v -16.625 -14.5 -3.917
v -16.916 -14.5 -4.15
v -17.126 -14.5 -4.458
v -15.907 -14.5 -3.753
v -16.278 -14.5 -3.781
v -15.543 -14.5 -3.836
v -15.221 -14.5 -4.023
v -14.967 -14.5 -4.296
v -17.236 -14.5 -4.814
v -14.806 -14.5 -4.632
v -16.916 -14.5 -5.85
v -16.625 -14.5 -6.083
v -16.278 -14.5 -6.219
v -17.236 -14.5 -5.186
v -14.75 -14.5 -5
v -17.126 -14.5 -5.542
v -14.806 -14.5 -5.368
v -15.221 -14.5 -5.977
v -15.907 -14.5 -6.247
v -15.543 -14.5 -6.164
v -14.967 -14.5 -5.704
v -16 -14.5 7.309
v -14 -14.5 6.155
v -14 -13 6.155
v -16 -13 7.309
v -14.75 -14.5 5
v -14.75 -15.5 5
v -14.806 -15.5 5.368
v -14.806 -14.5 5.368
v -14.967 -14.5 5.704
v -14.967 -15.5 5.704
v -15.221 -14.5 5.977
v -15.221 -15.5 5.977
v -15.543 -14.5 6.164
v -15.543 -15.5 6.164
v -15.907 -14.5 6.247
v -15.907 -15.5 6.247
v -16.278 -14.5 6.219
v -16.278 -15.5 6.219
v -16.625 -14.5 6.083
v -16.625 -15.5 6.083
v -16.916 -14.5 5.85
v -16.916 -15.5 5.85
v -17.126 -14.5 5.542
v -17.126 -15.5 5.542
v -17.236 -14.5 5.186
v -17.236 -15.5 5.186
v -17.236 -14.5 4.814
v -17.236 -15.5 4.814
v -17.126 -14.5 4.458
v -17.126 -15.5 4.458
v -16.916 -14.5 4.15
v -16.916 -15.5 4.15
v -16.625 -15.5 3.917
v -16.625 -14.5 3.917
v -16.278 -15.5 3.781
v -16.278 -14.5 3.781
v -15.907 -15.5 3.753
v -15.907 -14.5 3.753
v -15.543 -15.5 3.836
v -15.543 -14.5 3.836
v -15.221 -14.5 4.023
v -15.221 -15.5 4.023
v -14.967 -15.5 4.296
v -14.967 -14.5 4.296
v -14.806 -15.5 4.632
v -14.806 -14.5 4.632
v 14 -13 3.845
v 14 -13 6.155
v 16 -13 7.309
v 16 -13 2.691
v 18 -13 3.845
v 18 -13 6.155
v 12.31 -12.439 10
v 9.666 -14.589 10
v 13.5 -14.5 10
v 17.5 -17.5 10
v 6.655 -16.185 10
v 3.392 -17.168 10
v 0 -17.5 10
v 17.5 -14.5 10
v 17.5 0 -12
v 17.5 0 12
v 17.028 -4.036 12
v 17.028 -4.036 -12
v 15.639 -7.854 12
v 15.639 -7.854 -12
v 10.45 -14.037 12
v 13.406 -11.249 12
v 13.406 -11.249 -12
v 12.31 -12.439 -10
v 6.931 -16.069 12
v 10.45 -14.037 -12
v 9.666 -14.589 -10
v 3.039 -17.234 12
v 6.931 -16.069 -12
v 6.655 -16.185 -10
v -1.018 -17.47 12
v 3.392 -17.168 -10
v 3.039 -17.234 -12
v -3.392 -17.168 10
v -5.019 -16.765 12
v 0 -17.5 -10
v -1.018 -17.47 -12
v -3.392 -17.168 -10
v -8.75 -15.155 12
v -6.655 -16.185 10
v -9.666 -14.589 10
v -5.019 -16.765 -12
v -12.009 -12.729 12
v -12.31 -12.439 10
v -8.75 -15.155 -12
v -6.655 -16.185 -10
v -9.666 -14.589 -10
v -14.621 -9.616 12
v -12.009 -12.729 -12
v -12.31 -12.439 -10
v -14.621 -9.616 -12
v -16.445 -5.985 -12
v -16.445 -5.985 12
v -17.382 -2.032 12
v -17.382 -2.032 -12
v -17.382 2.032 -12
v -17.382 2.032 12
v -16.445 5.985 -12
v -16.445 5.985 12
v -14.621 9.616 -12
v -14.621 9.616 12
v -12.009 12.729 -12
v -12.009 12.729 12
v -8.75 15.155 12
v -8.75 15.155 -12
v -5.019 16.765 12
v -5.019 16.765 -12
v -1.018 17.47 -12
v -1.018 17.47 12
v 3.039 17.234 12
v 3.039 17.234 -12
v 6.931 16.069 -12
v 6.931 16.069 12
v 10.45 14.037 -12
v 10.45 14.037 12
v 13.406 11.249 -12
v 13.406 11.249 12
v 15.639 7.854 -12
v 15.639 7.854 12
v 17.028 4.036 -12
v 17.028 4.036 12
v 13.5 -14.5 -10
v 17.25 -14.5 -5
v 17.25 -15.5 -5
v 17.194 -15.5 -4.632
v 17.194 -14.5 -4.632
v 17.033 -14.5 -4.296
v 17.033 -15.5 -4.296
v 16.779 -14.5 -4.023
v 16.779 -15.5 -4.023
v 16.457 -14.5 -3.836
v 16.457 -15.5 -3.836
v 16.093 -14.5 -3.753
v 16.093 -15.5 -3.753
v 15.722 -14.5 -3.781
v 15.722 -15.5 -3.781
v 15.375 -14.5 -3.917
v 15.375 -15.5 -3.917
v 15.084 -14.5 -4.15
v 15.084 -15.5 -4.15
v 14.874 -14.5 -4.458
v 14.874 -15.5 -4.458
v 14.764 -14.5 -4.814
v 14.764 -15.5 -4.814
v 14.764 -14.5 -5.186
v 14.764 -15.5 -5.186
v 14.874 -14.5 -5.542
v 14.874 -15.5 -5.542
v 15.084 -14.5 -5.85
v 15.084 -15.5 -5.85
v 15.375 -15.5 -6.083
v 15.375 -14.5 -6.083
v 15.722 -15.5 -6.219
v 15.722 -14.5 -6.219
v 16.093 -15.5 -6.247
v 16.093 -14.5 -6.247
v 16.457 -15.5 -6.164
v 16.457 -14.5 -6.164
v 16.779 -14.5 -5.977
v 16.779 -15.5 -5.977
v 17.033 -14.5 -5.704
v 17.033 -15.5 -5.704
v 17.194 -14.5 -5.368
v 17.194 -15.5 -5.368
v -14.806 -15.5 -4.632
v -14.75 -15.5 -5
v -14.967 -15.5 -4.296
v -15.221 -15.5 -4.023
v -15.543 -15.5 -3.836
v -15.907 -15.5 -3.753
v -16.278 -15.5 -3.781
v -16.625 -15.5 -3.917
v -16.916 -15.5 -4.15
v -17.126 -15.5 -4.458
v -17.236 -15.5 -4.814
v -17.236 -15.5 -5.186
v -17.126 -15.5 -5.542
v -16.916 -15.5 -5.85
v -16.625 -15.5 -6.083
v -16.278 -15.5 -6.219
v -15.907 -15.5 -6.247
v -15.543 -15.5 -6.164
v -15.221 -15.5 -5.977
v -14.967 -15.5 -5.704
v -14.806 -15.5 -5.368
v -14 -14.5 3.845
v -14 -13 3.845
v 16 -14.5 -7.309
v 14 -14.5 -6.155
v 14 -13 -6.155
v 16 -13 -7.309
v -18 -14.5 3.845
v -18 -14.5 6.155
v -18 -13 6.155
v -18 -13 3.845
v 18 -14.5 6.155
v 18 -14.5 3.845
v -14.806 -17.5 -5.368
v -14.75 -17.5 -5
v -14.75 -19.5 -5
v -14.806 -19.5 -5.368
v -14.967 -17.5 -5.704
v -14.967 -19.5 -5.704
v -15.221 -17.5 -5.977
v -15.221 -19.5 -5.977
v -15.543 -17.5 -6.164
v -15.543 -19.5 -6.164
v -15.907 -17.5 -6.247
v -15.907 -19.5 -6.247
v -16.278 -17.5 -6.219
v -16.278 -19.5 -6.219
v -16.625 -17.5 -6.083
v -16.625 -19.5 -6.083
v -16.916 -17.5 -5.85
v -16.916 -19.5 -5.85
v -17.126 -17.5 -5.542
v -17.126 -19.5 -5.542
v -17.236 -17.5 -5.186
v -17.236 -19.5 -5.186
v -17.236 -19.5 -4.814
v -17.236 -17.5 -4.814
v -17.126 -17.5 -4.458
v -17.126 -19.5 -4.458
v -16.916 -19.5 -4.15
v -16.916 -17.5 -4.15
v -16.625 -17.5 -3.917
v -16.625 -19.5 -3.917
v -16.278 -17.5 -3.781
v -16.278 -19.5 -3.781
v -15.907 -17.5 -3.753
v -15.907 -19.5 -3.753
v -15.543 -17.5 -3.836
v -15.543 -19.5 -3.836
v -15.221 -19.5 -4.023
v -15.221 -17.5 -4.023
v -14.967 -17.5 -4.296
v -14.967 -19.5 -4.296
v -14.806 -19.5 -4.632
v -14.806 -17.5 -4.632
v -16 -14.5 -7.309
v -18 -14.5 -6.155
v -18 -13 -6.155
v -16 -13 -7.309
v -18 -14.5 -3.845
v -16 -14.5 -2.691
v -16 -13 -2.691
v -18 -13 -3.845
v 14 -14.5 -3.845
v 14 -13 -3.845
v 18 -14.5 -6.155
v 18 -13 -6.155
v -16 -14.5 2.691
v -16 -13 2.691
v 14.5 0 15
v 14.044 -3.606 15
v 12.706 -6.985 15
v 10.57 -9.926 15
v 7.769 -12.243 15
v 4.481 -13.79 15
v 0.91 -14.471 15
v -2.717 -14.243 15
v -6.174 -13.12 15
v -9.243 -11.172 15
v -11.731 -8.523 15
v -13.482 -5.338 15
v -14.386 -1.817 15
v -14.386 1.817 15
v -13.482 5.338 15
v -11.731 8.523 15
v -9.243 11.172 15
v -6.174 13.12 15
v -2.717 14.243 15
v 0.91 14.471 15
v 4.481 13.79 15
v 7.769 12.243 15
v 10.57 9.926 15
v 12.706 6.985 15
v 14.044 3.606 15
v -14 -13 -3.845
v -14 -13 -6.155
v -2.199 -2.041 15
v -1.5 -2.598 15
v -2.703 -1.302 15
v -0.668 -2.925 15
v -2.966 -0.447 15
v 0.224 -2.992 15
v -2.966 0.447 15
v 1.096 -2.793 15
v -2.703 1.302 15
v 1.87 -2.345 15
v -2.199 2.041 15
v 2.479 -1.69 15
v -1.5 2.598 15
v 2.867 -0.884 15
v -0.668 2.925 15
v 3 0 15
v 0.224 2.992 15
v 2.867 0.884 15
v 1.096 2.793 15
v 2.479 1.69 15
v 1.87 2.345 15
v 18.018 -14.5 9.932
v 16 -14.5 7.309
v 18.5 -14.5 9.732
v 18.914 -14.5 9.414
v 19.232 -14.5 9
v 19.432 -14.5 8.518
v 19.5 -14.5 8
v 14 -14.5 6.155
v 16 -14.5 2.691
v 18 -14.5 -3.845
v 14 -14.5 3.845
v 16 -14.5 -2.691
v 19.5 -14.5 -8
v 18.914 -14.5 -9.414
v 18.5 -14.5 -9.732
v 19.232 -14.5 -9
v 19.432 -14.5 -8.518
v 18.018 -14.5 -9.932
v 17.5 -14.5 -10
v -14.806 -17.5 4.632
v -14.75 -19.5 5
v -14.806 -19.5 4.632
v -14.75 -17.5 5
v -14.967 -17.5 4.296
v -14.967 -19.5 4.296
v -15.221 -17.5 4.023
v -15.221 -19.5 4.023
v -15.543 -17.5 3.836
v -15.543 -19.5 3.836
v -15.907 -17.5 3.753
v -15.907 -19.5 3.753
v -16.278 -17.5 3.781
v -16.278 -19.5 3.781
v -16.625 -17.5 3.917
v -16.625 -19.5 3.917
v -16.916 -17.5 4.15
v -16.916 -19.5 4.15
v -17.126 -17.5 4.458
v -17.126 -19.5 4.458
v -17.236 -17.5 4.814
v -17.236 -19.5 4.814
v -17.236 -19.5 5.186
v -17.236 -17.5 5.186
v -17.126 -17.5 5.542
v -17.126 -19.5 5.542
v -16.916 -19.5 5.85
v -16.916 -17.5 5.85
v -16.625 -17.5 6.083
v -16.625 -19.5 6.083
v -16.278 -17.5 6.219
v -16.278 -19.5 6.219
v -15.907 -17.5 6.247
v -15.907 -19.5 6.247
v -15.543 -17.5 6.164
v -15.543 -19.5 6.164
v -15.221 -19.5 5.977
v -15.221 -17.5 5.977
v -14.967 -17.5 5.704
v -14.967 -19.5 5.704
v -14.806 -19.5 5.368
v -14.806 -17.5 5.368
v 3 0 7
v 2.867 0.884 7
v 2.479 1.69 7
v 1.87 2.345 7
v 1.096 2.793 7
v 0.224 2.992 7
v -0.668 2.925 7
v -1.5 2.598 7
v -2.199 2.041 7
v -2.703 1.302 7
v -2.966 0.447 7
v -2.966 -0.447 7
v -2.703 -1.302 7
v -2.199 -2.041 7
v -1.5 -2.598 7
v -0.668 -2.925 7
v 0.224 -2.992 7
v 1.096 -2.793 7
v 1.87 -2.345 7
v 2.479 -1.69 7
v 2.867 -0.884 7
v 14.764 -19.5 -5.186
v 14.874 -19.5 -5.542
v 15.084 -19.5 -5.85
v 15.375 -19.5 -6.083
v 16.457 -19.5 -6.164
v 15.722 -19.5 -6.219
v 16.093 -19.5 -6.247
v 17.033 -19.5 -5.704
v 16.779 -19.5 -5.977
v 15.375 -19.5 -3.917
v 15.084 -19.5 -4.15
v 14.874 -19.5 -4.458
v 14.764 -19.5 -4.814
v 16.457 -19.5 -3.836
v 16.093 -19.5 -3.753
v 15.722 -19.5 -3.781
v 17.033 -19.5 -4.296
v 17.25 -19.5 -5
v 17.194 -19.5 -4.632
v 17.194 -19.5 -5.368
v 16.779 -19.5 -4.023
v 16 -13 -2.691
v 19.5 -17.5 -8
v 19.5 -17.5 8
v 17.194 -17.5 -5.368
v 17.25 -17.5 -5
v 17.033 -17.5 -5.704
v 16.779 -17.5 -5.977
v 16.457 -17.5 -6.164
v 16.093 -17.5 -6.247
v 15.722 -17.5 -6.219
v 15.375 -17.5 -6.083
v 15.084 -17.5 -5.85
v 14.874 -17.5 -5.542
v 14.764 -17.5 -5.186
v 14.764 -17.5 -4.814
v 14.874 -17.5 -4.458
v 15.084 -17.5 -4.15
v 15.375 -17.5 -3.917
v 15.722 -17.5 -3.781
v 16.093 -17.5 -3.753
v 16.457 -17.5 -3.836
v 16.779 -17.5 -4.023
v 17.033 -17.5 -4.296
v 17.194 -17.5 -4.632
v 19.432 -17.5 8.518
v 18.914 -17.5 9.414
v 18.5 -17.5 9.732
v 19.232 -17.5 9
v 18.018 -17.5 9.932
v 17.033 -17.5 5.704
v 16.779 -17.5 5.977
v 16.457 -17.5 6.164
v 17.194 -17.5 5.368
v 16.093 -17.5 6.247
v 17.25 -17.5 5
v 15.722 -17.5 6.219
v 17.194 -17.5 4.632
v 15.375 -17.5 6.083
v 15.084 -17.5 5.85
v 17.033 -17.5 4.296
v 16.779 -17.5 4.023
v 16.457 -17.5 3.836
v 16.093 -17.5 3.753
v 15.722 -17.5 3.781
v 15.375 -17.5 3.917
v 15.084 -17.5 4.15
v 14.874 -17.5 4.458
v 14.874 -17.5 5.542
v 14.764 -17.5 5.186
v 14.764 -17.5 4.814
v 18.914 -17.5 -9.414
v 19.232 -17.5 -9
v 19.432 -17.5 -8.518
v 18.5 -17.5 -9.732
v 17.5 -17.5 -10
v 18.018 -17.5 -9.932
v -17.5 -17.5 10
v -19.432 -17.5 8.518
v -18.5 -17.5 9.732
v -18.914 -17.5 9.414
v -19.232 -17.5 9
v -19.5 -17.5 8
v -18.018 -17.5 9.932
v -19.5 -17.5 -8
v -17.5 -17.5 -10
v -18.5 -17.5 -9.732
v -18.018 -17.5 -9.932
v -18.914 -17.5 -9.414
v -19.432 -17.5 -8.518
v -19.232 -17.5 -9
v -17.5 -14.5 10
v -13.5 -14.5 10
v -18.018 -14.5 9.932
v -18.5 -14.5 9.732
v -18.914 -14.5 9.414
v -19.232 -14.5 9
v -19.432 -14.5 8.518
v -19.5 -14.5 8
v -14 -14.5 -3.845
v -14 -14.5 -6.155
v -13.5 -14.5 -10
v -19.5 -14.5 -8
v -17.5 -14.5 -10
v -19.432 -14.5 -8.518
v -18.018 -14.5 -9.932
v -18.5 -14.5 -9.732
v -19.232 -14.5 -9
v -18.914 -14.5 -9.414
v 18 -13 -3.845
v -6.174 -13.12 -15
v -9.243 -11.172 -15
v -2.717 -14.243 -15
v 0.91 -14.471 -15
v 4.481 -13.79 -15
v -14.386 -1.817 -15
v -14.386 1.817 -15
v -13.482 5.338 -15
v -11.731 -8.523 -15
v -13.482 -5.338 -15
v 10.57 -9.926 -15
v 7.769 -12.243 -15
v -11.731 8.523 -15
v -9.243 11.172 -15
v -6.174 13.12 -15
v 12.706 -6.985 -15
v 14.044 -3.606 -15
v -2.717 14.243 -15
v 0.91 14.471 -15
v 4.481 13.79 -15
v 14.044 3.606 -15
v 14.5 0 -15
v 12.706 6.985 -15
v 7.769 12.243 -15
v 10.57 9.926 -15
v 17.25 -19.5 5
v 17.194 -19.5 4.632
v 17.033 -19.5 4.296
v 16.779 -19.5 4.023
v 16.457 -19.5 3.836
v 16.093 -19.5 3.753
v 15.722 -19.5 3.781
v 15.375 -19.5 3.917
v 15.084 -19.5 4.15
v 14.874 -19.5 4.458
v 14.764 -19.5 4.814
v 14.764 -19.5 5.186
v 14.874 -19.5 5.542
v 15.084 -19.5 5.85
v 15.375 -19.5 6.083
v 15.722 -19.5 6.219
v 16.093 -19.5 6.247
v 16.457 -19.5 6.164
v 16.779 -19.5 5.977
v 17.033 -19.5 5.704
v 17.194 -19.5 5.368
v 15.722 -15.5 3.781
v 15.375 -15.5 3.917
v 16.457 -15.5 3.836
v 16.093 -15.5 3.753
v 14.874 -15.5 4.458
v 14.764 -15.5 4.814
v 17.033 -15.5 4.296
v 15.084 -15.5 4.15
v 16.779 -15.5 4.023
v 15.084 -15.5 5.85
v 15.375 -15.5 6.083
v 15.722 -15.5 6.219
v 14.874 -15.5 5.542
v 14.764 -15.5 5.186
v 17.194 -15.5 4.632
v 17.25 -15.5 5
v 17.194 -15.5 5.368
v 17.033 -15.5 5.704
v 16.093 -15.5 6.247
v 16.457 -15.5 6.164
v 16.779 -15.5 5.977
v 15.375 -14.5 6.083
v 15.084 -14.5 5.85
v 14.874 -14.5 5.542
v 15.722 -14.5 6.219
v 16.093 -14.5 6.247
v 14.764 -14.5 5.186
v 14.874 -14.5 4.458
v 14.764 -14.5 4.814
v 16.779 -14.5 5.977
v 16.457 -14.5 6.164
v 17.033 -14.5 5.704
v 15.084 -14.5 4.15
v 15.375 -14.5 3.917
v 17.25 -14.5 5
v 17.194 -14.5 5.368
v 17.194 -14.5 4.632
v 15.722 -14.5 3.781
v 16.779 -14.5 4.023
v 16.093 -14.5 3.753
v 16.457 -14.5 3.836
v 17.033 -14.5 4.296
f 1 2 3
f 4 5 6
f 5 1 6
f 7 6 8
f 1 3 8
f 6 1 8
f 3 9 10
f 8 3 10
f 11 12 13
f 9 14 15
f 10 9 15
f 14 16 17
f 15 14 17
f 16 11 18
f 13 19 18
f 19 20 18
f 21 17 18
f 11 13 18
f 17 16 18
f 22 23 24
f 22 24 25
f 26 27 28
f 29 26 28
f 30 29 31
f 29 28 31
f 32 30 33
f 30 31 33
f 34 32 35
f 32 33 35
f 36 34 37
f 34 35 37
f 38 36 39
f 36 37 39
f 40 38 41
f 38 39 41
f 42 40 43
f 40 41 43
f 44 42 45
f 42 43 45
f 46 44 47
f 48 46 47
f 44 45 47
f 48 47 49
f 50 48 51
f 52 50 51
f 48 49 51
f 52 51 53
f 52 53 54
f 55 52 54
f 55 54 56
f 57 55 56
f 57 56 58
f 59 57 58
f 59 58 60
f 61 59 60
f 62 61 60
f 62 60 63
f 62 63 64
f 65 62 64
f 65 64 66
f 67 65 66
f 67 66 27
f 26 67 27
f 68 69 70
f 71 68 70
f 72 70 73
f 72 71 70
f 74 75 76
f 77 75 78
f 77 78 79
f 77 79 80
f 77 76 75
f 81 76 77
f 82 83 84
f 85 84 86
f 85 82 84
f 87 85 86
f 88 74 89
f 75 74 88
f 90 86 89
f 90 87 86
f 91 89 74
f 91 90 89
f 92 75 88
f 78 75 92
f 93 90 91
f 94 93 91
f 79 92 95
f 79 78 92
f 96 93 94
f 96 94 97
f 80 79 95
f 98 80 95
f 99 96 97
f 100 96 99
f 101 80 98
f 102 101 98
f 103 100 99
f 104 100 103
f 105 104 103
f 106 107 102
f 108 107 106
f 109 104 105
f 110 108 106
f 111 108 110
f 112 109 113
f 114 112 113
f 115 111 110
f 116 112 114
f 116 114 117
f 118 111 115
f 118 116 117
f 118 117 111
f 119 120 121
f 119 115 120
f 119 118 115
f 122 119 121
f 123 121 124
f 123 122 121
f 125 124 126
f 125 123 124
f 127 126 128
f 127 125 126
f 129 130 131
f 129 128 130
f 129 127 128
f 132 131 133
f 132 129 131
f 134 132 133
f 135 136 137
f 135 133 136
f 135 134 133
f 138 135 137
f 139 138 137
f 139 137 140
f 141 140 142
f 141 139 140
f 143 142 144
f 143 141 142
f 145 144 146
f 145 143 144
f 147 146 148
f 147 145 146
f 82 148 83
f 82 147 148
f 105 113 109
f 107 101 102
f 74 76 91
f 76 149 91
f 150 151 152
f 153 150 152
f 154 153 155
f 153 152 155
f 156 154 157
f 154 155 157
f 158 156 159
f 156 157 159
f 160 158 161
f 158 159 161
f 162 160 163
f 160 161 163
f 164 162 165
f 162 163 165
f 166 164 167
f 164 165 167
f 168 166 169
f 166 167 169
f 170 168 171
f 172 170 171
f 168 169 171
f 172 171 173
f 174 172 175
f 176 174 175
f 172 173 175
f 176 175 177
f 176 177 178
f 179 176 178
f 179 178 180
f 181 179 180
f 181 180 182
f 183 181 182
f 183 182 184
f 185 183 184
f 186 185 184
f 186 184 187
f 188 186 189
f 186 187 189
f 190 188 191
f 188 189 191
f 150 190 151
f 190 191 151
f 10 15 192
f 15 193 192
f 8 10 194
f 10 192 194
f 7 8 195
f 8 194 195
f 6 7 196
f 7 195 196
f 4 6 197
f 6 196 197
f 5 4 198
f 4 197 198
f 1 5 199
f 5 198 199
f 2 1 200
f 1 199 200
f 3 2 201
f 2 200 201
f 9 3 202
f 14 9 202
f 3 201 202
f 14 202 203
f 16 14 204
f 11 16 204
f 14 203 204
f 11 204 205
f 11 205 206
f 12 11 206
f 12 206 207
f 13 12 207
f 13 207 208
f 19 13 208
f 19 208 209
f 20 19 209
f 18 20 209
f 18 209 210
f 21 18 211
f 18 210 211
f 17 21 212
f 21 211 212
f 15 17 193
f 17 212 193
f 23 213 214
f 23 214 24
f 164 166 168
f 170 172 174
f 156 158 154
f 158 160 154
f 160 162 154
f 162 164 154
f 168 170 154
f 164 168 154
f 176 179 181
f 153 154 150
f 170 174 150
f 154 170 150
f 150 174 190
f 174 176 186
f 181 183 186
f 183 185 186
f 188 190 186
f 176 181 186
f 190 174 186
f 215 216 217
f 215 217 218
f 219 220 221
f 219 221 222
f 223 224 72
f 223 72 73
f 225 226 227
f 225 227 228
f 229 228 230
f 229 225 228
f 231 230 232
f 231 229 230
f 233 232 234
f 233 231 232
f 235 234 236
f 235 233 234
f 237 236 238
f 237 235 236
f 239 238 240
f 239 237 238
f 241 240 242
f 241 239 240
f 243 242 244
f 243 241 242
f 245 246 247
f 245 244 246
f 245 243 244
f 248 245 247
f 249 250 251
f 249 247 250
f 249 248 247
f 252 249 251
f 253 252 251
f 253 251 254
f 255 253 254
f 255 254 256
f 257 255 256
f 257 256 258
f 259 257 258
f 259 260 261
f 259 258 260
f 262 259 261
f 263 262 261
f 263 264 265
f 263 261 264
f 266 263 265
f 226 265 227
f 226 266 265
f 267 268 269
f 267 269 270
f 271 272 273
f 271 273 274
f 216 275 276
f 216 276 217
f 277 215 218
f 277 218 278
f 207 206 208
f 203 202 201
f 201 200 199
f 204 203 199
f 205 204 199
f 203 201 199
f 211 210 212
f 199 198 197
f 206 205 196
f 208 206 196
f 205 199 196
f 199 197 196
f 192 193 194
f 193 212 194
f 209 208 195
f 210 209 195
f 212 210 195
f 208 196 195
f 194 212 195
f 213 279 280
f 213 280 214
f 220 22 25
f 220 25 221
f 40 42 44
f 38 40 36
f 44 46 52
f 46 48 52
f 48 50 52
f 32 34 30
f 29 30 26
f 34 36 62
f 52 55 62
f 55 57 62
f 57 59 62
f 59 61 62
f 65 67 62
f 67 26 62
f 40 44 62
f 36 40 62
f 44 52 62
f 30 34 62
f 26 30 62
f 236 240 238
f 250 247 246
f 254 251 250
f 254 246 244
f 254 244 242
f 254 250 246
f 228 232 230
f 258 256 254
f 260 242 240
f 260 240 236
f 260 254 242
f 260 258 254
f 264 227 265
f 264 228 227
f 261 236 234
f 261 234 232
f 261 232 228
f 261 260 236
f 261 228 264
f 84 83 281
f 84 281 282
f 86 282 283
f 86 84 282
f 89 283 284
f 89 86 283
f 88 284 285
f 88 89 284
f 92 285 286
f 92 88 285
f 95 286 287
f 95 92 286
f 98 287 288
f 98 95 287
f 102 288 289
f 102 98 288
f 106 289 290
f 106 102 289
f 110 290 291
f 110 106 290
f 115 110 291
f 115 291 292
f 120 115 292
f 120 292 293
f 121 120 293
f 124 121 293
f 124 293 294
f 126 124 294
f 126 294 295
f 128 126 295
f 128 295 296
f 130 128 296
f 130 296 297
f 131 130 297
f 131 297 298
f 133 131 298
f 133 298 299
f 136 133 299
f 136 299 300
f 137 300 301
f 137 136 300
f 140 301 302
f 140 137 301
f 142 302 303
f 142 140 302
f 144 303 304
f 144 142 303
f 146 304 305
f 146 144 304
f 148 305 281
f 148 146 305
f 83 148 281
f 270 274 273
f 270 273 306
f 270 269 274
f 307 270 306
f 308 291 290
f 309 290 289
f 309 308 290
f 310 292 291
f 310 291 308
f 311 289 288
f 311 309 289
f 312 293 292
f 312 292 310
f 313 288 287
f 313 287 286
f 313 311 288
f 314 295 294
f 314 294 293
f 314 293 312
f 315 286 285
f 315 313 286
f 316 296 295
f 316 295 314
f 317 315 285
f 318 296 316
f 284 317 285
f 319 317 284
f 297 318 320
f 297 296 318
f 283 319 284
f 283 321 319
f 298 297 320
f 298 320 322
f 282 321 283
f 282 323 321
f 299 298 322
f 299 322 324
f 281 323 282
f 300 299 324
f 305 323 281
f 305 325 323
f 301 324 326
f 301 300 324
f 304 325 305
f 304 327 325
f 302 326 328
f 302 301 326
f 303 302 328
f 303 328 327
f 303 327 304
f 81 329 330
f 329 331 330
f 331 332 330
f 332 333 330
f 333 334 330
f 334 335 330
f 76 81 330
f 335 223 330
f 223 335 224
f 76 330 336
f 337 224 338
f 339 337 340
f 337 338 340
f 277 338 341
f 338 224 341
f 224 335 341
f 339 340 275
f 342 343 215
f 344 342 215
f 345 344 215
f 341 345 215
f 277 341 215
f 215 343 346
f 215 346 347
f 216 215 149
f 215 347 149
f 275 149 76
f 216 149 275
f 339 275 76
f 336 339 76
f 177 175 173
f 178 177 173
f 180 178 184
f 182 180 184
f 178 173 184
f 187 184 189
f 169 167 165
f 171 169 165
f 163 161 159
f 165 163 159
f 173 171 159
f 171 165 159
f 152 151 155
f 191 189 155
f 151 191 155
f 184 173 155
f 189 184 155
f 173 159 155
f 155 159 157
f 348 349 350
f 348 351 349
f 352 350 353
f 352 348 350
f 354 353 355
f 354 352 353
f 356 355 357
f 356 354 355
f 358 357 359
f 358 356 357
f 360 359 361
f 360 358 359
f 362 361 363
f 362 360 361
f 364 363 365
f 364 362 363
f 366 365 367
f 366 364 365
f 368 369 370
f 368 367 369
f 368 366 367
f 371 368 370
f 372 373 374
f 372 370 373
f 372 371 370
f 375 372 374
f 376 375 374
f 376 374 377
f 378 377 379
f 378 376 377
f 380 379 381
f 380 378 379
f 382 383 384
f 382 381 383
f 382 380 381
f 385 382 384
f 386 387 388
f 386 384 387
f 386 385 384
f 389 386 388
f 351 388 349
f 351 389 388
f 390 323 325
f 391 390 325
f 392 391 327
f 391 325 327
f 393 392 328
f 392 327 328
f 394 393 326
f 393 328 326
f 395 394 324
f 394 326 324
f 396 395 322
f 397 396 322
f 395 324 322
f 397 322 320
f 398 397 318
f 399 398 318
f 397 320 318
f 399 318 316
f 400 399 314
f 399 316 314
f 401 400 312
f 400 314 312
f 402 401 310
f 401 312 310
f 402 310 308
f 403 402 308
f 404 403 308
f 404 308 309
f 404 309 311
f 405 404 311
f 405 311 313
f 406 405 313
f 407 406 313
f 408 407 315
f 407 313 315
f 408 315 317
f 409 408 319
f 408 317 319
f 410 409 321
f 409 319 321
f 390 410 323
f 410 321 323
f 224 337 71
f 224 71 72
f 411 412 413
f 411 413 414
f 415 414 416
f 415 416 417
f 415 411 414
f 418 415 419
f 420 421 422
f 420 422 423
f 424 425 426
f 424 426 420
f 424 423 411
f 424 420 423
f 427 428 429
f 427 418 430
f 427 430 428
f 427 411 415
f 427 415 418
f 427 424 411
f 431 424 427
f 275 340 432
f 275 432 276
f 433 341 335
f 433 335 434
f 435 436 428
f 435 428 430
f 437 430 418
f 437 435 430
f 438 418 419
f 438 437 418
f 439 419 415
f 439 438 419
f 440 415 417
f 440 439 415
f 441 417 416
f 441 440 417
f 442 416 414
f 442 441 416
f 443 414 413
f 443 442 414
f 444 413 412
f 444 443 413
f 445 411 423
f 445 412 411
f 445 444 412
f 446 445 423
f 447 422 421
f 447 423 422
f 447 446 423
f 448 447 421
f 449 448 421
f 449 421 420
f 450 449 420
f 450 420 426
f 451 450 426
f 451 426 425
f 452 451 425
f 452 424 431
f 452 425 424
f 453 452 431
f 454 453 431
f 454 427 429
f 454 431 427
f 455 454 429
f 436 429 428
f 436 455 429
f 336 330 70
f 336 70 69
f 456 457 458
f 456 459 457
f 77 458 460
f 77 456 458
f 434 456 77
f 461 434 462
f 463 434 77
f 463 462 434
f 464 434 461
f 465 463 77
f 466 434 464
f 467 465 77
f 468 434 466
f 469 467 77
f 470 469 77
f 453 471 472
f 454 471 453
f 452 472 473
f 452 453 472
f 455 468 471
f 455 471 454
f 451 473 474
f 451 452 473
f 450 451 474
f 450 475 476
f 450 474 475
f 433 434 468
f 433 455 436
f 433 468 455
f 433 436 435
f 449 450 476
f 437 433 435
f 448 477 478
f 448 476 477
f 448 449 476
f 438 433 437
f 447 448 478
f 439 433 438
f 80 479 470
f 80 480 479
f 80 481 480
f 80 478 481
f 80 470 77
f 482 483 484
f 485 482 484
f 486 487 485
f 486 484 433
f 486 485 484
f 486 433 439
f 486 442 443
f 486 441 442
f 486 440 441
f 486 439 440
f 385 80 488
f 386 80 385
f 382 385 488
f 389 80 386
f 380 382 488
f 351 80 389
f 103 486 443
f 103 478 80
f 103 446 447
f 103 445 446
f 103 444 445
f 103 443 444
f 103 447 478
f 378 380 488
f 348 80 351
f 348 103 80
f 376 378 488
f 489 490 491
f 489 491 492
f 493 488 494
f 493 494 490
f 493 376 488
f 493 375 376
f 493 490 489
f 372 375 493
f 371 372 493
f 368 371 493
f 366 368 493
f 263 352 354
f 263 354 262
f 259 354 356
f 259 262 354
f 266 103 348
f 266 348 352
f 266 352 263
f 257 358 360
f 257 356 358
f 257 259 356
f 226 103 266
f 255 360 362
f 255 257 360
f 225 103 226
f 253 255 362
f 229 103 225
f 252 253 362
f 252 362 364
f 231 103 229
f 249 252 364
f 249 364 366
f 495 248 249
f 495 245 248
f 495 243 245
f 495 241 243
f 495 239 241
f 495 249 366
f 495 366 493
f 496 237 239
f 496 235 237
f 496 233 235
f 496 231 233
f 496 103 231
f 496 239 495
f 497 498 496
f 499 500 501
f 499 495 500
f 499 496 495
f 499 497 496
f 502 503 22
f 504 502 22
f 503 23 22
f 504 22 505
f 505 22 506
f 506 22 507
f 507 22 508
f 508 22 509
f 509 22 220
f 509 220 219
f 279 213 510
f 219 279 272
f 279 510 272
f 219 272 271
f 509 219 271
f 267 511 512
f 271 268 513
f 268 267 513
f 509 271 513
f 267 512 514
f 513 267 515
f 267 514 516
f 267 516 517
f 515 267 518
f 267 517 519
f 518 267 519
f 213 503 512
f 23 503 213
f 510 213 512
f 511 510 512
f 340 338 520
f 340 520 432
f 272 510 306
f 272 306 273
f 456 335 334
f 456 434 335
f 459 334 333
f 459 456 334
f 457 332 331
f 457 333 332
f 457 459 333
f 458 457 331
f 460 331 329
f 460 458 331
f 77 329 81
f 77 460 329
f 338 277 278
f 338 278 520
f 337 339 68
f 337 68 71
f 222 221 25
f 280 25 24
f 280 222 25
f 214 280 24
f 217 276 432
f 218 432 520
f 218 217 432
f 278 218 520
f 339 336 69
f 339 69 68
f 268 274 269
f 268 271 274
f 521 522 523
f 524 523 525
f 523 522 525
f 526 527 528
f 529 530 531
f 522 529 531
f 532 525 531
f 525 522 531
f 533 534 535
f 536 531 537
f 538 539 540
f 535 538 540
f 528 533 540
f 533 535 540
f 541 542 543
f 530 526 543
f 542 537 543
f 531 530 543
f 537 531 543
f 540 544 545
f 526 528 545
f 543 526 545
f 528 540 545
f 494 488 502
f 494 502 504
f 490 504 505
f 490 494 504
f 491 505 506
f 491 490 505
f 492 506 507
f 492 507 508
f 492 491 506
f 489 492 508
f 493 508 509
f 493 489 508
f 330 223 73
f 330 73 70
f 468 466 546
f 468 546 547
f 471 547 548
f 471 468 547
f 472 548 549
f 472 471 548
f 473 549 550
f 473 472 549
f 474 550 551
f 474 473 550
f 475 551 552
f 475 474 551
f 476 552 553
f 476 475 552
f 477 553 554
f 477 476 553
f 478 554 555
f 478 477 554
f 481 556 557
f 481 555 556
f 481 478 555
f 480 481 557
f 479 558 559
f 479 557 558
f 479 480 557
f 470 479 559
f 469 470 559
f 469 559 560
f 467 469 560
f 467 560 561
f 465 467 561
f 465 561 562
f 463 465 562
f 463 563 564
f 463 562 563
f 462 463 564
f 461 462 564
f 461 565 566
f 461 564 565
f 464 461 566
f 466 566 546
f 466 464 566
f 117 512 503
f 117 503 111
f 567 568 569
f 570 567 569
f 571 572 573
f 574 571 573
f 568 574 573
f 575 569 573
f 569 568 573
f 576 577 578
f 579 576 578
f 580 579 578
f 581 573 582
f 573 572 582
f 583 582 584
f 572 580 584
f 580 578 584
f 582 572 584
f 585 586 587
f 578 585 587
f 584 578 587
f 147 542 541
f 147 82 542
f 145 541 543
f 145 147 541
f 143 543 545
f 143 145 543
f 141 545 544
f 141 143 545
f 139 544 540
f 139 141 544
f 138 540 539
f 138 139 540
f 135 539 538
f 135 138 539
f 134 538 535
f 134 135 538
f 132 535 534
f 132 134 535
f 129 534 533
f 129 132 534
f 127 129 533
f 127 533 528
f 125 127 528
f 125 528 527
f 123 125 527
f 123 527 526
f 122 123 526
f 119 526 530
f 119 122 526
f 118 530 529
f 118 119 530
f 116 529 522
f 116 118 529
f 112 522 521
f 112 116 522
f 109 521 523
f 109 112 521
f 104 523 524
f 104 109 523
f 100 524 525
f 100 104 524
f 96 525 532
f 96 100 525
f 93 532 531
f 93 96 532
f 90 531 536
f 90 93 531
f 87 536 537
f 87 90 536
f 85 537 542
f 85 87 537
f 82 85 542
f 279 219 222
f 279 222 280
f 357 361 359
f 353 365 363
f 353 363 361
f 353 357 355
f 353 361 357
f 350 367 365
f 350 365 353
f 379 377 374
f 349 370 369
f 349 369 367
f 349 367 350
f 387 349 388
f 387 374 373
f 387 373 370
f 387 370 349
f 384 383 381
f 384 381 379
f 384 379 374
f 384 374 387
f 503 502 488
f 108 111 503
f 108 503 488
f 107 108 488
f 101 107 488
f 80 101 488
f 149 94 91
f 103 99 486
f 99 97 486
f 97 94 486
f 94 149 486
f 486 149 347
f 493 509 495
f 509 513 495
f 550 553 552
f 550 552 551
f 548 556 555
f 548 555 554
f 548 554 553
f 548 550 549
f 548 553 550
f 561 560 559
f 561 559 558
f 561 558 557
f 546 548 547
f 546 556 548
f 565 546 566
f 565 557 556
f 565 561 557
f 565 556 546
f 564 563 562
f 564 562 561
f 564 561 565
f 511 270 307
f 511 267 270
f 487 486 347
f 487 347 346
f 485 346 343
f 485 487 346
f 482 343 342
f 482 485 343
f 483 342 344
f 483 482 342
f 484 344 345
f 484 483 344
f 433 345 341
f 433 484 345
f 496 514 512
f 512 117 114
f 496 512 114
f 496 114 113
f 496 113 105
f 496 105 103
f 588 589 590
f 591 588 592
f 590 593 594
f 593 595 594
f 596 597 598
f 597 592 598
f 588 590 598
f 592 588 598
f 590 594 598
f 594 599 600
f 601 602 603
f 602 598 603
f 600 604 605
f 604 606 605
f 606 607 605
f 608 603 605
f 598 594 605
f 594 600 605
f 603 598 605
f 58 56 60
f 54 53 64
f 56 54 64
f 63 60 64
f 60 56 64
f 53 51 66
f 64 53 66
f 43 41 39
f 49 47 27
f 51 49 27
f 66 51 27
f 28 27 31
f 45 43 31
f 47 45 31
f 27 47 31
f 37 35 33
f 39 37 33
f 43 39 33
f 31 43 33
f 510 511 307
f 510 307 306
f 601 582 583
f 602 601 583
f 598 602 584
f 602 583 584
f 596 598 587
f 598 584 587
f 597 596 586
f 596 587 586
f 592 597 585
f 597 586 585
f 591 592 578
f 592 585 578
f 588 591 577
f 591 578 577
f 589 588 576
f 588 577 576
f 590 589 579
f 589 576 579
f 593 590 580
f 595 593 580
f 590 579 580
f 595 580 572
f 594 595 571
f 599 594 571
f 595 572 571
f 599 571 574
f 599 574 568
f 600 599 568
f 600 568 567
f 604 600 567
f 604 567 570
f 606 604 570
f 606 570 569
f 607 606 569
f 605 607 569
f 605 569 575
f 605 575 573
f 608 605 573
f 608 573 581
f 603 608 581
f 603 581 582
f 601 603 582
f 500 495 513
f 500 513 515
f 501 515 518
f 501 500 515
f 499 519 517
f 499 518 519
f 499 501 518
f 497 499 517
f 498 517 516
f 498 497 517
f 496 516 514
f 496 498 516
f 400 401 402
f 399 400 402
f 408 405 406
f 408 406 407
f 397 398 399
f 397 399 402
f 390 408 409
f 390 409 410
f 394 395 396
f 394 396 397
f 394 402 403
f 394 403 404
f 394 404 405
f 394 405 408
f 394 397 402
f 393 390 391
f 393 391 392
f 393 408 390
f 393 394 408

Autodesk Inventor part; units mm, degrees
ref_plane "YZ Plane" through (0, 0, 0) normal (1, 0, 0) x (0, 1, 0)
ref_plane "XZ Plane" through (0, 0, 0) normal (0, 1, 0) x (-1, 0, 0)
ref_plane "XY Plane" through (0, 0, 0) normal (0, 0, 1) x (1, 0, 0)
sketch "Sketch1" plane through (0, 0, 0) normal (0, 0, 1) x (1, 0, 0)
  circle A0 centre (0, 0) radius 17.5
  dimension "d0" = 35
extrude "Extrusion1" add sketch "Sketch1" along normal mid plane 30
sketch "Sketch2" plane through (0, 0, 0) normal (0, 0, 1) x (1, 0, 0)
  line L0 (0, 0) -> (0, -17.5) construction
  line L1 (0, -17.5) -> (-17.5, -17.5)
  line L2 (-17.5, -17.5) -> (-17.5, -14.5) construction
  line L3 (-17.5, -14.5) -> (-13.5, -14.5)
  line L4 (-13.5, -14.5) -> (-11.1906, -10.5)
  line L5 (0, -17.5) -> (17.5, -17.5)
  line L6 (17.5, -17.5) -> (17.5, -14.5) construction
  line L7 (17.5, -14.5) -> (13.5, -14.5)
  line L8 (13.5, -14.5) -> (11.1906, -10.5)
  line L9 (-11.1906, -10.5) -> (11.1906, -10.5)
  circle A0 centre (0, 0) radius 17.5 construction
  line L10 (0, 0) -> (0, -17.5) construction
  line L11 (0, -17.5) -> (25.1989, -17.5) construction
  line L12 (0, 0) -> (-17.5, 0) construction
  line L13 (-17.5, -14.5) -> (-19.5, -14.5)
  line L14 (-19.5, -14.5) -> (-19.5, -17.5)
  line L15 (-19.5, -17.5) -> (-17.5, -17.5)
  line L16 (17.5, -14.5) -> (19.5, -14.5)
  line L17 (19.5, -14.5) -> (19.5, -17.5)
  line L18 (19.5, -17.5) -> (17.5, -17.5)
  dimension "d4" = 3
  dimension "d5" = 4
  dimension "d6" = 60
  dimension "d16" = 0
  dimension "d17" = 4
  dimension "d18" = 2
  dimension "d31" = 35
  dimension "d32" = 39
extrude "Extrusion2" add sketch "Sketch2" along normal mid plane 20
chamfer "Chamfer1" distance 3 angle 45 2 edges at (-17.5, 0, 15) (-17.5, 0, -15)
sketch "Sketch3" plane through (0, 0, 15) normal (0, 0, 1) x (1, 0, 0)
  circle A0 centre (0, 0) radius 14.5 projected
  circle A1 centre (0, 0) radius 3
  dimension "d12" = 6
extrude "Extrusion3" cut sketch "Sketch3" against normal blind 8 contours A1
sketch "Sketch4" plane through (-19.5, -17.5, 10) normal (0, -1, 0) x (1, 0, 0)
  line L0 (19.5, 0) -> (0, 0) construction
  line L1 (0, 0) -> (0, -20) construction
  line L2 (0, -20) -> (19.5, -20) construction
  line L3 (39, 0) -> (39, -20) construction
  line L4 (2, -22) -> (2, 2) construction
  line L5 (37, -22) -> (37, 2) construction
  line L6 (33, 0) -> (33, -20) construction
  line L7 (7.1902, -20) -> (7.1902, 0) construction
  line L8 (2, -5) -> (37, -5) construction
  line L9 (37, -5) -> (37, -15) construction
  line L10 (37, -15) -> (2, -15) construction
  line L11 (2, -15) -> (2, -5) construction
  line L12 (19.5, -20) -> (39, -20) projected
  line L13 (39, 0) -> (19.5, 0) projected
  line L14 (19.5, -20) -> (31.8098, -20) construction
  line L15 (19.5, -20) -> (19.5, 0) construction
  line L16 (22.5, -3) -> (16.5, -3) construction
  line L17 (3.5, -5) -> (35.5, -5) construction
  line L18 (35.5, -5) -> (35.5, -15) construction
  line L19 (35.5, -15) -> (3.5, -15) construction
  line L20 (3.5, -15) -> (3.5, -5) construction
  circle A0 centre (3.5, -5) radius 1.25
  circle A1 centre (3.5, -15) radius 1.25
  circle A2 centre (35.5, -5) radius 1.25
  circle A3 centre (35.5, -15) radius 1.25
  point P0 (19.5, -10)
  dimension "d19" = 5
  dimension "d20" = 5
  dimension "d33" = 16
  dimension "d34" = 16
  dimension "d35" = 2.5
extrude "Extrusion4" cut sketch "Sketch4" against normal up to surface (3 mm away)
fillet "Fillet2" radius 2 4 edges at (-19.5, -16, 10) (19.5, -16, 10) (19.5, -16, -10) (-19.5, -16, -10)
sketch "Sketch5" plane through (-13.5, -14.5, 10) normal (0, 1, 0) x (1, 0, 0)
  arc A0 (-4, 20) -> (-6, 18) centre (-4, 18) ccw projected
  line L0 (-6, 2) -> (-6, 18) projected
  arc A1 (-6, 2) -> (-4, 0) centre (-4, 2) ccw projected
  line L1 (-4, 0) -> (0, 0) projected
  line L2 (0, 0) -> (0, 20) projected
  line L3 (0, 20) -> (-4, 20) projected
  line L4 (31.5, 3.8453) -> (29.5, 2.6906)
  line L5 (29.5, 2.6906) -> (27.5, 3.8453)
  line L6 (27.5, 3.8453) -> (27.5, 6.1547)
  line L7 (27.5, 6.1547) -> (29.5, 7.3094)
  line L8 (29.5, 7.3094) -> (31.5, 6.1547)
  line L9 (31.5, 6.1547) -> (31.5, 3.8453)
  circle A2 centre (-2.5, 5) radius 1.25 projected
  circle A3 centre (-2.5, 15) radius 1.25 projected
  circle A4 centre (29.5, 5) radius 1.25 projected
  circle A5 centre (29.5, 15) radius 1.25 projected
  line L10 (-6, 2) -> (-6, 18) projected
  line L11 (27.5, 13.8453) -> (27.5, 16.1547)
  line L12 (29.5, 12.6906) -> (27.5, 13.8453)
  line L13 (27.5, 16.1547) -> (29.5, 17.3094)
  line L14 (29.5, 17.3094) -> (31.5, 16.1547)
  line L15 (31.5, 16.1547) -> (31.5, 13.8453)
  line L16 (31.5, 13.8453) -> (29.5, 12.6906)
  line L17 (-4.5, 13.8453) -> (-4.5, 16.1547)
  line L18 (-2.5, 12.6906) -> (-4.5, 13.8453)
  line L19 (-4.5, 16.1547) -> (-2.5, 17.3094)
  line L20 (-2.5, 17.3094) -> (-0.5, 16.1547)
  line L21 (-0.5, 16.1547) -> (-0.5, 13.8453)
  line L22 (-0.5, 13.8453) -> (-2.5, 12.6906)
  line L23 (-4.5, 3.8453) -> (-4.5, 6.1547)
  line L24 (-2.5, 2.6906) -> (-4.5, 3.8453)
  line L25 (-4.5, 6.1547) -> (-2.5, 7.3094)
  line L26 (-2.5, 7.3094) -> (-0.5, 6.1547)
  line L27 (-0.5, 6.1547) -> (-0.5, 3.8453)
  line L28 (-0.5, 3.8453) -> (-2.5, 2.6906)
  point P0 (13.5, 10)
  dimension "d26" = 4
  dimension "d36" = 4
  dimension "d37" = 4
  dimension "d38" = 4
extrude "Extrusion5" add sketch "Sketch5" along normal blind 1.5 contours L4 L5 L6 L7 L8 L9 | A2 | A3 | A4 | A5 | L11 L13 L14 L15 L16 L12 | L17 L19 L20 L21 L22 L18 | L23 L25 L26 L27 L28 L24
sketch "Sketch6" plane through (-17.5, -17.5, -10) normal (0, -1, 0) x (1, 0, 0)
  circle A0 centre (1.5, 15) radius 1.25 projected
  circle A1 centre (33.5, 15) radius 1.25 projected
  circle A2 centre (1.5, 5) radius 1.25 projected
  circle A3 centre (33.5, 5) radius 1.25 projected
  point P0 (17.5, 10)
extrude "Extrusion6" add sketch "Sketch6" along normal mid plane 4
properties part number "Motor1"
